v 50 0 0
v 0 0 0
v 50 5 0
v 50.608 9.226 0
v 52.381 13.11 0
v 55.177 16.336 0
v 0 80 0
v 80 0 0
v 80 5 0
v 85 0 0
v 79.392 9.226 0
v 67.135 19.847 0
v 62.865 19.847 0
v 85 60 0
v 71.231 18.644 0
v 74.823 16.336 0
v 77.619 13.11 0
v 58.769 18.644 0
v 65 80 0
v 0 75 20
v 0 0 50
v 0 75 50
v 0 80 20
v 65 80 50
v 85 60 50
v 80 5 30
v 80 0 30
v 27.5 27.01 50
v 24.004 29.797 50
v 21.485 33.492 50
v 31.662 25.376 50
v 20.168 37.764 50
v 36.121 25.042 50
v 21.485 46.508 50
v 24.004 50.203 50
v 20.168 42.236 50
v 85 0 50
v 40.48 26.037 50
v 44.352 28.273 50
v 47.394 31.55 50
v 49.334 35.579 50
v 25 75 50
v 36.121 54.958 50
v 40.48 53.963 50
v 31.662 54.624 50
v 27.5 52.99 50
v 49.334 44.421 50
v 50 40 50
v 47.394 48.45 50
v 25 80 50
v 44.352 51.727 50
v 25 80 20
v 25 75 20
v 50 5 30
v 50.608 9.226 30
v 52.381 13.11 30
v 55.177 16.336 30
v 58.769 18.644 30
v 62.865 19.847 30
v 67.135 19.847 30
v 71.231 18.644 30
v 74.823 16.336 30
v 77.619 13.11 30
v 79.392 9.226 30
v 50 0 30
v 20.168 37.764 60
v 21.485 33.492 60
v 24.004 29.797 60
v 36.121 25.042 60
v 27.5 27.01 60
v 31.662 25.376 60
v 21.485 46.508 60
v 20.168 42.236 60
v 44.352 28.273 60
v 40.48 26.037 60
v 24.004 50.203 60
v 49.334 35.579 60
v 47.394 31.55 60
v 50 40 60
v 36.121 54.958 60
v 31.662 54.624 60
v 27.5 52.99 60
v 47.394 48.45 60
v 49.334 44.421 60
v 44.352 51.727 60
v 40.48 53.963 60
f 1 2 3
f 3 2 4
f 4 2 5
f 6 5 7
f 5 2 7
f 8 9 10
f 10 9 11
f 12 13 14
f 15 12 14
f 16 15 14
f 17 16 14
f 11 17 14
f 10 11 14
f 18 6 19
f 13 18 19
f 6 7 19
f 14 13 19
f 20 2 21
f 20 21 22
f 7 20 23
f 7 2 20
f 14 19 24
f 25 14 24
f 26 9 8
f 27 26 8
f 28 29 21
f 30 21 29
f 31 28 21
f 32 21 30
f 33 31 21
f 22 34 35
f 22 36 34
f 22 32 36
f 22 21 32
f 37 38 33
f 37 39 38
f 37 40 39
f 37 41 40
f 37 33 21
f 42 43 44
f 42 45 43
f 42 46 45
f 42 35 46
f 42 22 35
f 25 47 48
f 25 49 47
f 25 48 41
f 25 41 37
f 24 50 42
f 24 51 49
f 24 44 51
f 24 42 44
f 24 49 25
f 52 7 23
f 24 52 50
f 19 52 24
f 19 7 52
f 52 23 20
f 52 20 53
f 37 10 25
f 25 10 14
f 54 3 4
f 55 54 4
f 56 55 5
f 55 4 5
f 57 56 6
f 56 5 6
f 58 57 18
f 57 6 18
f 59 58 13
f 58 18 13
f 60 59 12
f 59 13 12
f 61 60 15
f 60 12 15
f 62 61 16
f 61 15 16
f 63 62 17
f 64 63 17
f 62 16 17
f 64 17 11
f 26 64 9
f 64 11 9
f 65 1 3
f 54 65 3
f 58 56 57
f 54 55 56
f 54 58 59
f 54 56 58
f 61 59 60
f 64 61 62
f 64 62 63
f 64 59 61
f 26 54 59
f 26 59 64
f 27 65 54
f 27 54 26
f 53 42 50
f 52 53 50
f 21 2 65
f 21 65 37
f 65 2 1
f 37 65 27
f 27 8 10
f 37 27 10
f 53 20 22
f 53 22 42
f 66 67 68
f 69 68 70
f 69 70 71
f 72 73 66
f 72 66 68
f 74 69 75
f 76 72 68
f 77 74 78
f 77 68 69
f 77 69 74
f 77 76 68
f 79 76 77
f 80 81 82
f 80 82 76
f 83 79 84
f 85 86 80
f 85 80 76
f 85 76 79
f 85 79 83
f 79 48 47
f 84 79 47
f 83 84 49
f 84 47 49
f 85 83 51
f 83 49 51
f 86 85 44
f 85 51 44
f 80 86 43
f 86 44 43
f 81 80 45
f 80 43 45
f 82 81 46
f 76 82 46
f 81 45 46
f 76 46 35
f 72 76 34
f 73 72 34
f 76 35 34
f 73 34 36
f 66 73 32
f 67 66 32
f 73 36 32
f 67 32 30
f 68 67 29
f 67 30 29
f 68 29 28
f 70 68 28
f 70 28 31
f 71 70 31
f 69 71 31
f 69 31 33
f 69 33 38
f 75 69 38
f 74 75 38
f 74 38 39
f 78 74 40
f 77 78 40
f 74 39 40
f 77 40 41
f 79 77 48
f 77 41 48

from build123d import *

# Parameters (mm, degrees)
F0_W     = 85
F0_H     = 80
F1_DEPTH = 50
F2_SIZE  = 20
F3_W     = 25
F3_H     = 5
F4_DEPTH = 30
F5_R     = 15
F6_DEPTH = 10
F8_DEPTH = 30


with BuildPart() as f1:
    # F0 (on Top) → F1 (new body)
    with BuildSketch(Plane.XY):
        with Locations((42.5, 40)):
            Rectangle(F0_W, F0_H)
    extrude(amount=F1_DEPTH)

    # F2
    f2_edges = [f1.edges().sort_by_distance(p)[0] for p in [
        (85, 80, 25),
    ]]
    chamfer(f2_edges, length=F2_SIZE)

    # F3 (on face) → F4 (cut)
    with BuildSketch(Plane.XY.offset(50)):
        with Locations((12.5, 77.5)):
            Rectangle(F3_W, F3_H)
    extrude(amount=-F4_DEPTH, mode=Mode.SUBTRACT)

    # F5 (on face) → F6 (join)
    with BuildSketch(Plane.XY.offset(50)):
        with Locations((35, 40)):
            Circle(F5_R)
    extrude(amount=F6_DEPTH)

    # F7 (on face) → F8 (cut)
    with BuildSketch(Plane(origin=(0, 0, 0), x_dir=(1, 0, 0), z_dir=(0, 0, -1))):
        with BuildLine():
            Line((50, 0), (50, -5))
            ThreePointArc((50, -5), (65, -20), (80, -5))
            Line((80, -5), (80, 0))
            Line((80, 0), (50, 0))
        make_face()
    extrude(amount=-F8_DEPTH, mode=Mode.SUBTRACT)


solid = f1.part
